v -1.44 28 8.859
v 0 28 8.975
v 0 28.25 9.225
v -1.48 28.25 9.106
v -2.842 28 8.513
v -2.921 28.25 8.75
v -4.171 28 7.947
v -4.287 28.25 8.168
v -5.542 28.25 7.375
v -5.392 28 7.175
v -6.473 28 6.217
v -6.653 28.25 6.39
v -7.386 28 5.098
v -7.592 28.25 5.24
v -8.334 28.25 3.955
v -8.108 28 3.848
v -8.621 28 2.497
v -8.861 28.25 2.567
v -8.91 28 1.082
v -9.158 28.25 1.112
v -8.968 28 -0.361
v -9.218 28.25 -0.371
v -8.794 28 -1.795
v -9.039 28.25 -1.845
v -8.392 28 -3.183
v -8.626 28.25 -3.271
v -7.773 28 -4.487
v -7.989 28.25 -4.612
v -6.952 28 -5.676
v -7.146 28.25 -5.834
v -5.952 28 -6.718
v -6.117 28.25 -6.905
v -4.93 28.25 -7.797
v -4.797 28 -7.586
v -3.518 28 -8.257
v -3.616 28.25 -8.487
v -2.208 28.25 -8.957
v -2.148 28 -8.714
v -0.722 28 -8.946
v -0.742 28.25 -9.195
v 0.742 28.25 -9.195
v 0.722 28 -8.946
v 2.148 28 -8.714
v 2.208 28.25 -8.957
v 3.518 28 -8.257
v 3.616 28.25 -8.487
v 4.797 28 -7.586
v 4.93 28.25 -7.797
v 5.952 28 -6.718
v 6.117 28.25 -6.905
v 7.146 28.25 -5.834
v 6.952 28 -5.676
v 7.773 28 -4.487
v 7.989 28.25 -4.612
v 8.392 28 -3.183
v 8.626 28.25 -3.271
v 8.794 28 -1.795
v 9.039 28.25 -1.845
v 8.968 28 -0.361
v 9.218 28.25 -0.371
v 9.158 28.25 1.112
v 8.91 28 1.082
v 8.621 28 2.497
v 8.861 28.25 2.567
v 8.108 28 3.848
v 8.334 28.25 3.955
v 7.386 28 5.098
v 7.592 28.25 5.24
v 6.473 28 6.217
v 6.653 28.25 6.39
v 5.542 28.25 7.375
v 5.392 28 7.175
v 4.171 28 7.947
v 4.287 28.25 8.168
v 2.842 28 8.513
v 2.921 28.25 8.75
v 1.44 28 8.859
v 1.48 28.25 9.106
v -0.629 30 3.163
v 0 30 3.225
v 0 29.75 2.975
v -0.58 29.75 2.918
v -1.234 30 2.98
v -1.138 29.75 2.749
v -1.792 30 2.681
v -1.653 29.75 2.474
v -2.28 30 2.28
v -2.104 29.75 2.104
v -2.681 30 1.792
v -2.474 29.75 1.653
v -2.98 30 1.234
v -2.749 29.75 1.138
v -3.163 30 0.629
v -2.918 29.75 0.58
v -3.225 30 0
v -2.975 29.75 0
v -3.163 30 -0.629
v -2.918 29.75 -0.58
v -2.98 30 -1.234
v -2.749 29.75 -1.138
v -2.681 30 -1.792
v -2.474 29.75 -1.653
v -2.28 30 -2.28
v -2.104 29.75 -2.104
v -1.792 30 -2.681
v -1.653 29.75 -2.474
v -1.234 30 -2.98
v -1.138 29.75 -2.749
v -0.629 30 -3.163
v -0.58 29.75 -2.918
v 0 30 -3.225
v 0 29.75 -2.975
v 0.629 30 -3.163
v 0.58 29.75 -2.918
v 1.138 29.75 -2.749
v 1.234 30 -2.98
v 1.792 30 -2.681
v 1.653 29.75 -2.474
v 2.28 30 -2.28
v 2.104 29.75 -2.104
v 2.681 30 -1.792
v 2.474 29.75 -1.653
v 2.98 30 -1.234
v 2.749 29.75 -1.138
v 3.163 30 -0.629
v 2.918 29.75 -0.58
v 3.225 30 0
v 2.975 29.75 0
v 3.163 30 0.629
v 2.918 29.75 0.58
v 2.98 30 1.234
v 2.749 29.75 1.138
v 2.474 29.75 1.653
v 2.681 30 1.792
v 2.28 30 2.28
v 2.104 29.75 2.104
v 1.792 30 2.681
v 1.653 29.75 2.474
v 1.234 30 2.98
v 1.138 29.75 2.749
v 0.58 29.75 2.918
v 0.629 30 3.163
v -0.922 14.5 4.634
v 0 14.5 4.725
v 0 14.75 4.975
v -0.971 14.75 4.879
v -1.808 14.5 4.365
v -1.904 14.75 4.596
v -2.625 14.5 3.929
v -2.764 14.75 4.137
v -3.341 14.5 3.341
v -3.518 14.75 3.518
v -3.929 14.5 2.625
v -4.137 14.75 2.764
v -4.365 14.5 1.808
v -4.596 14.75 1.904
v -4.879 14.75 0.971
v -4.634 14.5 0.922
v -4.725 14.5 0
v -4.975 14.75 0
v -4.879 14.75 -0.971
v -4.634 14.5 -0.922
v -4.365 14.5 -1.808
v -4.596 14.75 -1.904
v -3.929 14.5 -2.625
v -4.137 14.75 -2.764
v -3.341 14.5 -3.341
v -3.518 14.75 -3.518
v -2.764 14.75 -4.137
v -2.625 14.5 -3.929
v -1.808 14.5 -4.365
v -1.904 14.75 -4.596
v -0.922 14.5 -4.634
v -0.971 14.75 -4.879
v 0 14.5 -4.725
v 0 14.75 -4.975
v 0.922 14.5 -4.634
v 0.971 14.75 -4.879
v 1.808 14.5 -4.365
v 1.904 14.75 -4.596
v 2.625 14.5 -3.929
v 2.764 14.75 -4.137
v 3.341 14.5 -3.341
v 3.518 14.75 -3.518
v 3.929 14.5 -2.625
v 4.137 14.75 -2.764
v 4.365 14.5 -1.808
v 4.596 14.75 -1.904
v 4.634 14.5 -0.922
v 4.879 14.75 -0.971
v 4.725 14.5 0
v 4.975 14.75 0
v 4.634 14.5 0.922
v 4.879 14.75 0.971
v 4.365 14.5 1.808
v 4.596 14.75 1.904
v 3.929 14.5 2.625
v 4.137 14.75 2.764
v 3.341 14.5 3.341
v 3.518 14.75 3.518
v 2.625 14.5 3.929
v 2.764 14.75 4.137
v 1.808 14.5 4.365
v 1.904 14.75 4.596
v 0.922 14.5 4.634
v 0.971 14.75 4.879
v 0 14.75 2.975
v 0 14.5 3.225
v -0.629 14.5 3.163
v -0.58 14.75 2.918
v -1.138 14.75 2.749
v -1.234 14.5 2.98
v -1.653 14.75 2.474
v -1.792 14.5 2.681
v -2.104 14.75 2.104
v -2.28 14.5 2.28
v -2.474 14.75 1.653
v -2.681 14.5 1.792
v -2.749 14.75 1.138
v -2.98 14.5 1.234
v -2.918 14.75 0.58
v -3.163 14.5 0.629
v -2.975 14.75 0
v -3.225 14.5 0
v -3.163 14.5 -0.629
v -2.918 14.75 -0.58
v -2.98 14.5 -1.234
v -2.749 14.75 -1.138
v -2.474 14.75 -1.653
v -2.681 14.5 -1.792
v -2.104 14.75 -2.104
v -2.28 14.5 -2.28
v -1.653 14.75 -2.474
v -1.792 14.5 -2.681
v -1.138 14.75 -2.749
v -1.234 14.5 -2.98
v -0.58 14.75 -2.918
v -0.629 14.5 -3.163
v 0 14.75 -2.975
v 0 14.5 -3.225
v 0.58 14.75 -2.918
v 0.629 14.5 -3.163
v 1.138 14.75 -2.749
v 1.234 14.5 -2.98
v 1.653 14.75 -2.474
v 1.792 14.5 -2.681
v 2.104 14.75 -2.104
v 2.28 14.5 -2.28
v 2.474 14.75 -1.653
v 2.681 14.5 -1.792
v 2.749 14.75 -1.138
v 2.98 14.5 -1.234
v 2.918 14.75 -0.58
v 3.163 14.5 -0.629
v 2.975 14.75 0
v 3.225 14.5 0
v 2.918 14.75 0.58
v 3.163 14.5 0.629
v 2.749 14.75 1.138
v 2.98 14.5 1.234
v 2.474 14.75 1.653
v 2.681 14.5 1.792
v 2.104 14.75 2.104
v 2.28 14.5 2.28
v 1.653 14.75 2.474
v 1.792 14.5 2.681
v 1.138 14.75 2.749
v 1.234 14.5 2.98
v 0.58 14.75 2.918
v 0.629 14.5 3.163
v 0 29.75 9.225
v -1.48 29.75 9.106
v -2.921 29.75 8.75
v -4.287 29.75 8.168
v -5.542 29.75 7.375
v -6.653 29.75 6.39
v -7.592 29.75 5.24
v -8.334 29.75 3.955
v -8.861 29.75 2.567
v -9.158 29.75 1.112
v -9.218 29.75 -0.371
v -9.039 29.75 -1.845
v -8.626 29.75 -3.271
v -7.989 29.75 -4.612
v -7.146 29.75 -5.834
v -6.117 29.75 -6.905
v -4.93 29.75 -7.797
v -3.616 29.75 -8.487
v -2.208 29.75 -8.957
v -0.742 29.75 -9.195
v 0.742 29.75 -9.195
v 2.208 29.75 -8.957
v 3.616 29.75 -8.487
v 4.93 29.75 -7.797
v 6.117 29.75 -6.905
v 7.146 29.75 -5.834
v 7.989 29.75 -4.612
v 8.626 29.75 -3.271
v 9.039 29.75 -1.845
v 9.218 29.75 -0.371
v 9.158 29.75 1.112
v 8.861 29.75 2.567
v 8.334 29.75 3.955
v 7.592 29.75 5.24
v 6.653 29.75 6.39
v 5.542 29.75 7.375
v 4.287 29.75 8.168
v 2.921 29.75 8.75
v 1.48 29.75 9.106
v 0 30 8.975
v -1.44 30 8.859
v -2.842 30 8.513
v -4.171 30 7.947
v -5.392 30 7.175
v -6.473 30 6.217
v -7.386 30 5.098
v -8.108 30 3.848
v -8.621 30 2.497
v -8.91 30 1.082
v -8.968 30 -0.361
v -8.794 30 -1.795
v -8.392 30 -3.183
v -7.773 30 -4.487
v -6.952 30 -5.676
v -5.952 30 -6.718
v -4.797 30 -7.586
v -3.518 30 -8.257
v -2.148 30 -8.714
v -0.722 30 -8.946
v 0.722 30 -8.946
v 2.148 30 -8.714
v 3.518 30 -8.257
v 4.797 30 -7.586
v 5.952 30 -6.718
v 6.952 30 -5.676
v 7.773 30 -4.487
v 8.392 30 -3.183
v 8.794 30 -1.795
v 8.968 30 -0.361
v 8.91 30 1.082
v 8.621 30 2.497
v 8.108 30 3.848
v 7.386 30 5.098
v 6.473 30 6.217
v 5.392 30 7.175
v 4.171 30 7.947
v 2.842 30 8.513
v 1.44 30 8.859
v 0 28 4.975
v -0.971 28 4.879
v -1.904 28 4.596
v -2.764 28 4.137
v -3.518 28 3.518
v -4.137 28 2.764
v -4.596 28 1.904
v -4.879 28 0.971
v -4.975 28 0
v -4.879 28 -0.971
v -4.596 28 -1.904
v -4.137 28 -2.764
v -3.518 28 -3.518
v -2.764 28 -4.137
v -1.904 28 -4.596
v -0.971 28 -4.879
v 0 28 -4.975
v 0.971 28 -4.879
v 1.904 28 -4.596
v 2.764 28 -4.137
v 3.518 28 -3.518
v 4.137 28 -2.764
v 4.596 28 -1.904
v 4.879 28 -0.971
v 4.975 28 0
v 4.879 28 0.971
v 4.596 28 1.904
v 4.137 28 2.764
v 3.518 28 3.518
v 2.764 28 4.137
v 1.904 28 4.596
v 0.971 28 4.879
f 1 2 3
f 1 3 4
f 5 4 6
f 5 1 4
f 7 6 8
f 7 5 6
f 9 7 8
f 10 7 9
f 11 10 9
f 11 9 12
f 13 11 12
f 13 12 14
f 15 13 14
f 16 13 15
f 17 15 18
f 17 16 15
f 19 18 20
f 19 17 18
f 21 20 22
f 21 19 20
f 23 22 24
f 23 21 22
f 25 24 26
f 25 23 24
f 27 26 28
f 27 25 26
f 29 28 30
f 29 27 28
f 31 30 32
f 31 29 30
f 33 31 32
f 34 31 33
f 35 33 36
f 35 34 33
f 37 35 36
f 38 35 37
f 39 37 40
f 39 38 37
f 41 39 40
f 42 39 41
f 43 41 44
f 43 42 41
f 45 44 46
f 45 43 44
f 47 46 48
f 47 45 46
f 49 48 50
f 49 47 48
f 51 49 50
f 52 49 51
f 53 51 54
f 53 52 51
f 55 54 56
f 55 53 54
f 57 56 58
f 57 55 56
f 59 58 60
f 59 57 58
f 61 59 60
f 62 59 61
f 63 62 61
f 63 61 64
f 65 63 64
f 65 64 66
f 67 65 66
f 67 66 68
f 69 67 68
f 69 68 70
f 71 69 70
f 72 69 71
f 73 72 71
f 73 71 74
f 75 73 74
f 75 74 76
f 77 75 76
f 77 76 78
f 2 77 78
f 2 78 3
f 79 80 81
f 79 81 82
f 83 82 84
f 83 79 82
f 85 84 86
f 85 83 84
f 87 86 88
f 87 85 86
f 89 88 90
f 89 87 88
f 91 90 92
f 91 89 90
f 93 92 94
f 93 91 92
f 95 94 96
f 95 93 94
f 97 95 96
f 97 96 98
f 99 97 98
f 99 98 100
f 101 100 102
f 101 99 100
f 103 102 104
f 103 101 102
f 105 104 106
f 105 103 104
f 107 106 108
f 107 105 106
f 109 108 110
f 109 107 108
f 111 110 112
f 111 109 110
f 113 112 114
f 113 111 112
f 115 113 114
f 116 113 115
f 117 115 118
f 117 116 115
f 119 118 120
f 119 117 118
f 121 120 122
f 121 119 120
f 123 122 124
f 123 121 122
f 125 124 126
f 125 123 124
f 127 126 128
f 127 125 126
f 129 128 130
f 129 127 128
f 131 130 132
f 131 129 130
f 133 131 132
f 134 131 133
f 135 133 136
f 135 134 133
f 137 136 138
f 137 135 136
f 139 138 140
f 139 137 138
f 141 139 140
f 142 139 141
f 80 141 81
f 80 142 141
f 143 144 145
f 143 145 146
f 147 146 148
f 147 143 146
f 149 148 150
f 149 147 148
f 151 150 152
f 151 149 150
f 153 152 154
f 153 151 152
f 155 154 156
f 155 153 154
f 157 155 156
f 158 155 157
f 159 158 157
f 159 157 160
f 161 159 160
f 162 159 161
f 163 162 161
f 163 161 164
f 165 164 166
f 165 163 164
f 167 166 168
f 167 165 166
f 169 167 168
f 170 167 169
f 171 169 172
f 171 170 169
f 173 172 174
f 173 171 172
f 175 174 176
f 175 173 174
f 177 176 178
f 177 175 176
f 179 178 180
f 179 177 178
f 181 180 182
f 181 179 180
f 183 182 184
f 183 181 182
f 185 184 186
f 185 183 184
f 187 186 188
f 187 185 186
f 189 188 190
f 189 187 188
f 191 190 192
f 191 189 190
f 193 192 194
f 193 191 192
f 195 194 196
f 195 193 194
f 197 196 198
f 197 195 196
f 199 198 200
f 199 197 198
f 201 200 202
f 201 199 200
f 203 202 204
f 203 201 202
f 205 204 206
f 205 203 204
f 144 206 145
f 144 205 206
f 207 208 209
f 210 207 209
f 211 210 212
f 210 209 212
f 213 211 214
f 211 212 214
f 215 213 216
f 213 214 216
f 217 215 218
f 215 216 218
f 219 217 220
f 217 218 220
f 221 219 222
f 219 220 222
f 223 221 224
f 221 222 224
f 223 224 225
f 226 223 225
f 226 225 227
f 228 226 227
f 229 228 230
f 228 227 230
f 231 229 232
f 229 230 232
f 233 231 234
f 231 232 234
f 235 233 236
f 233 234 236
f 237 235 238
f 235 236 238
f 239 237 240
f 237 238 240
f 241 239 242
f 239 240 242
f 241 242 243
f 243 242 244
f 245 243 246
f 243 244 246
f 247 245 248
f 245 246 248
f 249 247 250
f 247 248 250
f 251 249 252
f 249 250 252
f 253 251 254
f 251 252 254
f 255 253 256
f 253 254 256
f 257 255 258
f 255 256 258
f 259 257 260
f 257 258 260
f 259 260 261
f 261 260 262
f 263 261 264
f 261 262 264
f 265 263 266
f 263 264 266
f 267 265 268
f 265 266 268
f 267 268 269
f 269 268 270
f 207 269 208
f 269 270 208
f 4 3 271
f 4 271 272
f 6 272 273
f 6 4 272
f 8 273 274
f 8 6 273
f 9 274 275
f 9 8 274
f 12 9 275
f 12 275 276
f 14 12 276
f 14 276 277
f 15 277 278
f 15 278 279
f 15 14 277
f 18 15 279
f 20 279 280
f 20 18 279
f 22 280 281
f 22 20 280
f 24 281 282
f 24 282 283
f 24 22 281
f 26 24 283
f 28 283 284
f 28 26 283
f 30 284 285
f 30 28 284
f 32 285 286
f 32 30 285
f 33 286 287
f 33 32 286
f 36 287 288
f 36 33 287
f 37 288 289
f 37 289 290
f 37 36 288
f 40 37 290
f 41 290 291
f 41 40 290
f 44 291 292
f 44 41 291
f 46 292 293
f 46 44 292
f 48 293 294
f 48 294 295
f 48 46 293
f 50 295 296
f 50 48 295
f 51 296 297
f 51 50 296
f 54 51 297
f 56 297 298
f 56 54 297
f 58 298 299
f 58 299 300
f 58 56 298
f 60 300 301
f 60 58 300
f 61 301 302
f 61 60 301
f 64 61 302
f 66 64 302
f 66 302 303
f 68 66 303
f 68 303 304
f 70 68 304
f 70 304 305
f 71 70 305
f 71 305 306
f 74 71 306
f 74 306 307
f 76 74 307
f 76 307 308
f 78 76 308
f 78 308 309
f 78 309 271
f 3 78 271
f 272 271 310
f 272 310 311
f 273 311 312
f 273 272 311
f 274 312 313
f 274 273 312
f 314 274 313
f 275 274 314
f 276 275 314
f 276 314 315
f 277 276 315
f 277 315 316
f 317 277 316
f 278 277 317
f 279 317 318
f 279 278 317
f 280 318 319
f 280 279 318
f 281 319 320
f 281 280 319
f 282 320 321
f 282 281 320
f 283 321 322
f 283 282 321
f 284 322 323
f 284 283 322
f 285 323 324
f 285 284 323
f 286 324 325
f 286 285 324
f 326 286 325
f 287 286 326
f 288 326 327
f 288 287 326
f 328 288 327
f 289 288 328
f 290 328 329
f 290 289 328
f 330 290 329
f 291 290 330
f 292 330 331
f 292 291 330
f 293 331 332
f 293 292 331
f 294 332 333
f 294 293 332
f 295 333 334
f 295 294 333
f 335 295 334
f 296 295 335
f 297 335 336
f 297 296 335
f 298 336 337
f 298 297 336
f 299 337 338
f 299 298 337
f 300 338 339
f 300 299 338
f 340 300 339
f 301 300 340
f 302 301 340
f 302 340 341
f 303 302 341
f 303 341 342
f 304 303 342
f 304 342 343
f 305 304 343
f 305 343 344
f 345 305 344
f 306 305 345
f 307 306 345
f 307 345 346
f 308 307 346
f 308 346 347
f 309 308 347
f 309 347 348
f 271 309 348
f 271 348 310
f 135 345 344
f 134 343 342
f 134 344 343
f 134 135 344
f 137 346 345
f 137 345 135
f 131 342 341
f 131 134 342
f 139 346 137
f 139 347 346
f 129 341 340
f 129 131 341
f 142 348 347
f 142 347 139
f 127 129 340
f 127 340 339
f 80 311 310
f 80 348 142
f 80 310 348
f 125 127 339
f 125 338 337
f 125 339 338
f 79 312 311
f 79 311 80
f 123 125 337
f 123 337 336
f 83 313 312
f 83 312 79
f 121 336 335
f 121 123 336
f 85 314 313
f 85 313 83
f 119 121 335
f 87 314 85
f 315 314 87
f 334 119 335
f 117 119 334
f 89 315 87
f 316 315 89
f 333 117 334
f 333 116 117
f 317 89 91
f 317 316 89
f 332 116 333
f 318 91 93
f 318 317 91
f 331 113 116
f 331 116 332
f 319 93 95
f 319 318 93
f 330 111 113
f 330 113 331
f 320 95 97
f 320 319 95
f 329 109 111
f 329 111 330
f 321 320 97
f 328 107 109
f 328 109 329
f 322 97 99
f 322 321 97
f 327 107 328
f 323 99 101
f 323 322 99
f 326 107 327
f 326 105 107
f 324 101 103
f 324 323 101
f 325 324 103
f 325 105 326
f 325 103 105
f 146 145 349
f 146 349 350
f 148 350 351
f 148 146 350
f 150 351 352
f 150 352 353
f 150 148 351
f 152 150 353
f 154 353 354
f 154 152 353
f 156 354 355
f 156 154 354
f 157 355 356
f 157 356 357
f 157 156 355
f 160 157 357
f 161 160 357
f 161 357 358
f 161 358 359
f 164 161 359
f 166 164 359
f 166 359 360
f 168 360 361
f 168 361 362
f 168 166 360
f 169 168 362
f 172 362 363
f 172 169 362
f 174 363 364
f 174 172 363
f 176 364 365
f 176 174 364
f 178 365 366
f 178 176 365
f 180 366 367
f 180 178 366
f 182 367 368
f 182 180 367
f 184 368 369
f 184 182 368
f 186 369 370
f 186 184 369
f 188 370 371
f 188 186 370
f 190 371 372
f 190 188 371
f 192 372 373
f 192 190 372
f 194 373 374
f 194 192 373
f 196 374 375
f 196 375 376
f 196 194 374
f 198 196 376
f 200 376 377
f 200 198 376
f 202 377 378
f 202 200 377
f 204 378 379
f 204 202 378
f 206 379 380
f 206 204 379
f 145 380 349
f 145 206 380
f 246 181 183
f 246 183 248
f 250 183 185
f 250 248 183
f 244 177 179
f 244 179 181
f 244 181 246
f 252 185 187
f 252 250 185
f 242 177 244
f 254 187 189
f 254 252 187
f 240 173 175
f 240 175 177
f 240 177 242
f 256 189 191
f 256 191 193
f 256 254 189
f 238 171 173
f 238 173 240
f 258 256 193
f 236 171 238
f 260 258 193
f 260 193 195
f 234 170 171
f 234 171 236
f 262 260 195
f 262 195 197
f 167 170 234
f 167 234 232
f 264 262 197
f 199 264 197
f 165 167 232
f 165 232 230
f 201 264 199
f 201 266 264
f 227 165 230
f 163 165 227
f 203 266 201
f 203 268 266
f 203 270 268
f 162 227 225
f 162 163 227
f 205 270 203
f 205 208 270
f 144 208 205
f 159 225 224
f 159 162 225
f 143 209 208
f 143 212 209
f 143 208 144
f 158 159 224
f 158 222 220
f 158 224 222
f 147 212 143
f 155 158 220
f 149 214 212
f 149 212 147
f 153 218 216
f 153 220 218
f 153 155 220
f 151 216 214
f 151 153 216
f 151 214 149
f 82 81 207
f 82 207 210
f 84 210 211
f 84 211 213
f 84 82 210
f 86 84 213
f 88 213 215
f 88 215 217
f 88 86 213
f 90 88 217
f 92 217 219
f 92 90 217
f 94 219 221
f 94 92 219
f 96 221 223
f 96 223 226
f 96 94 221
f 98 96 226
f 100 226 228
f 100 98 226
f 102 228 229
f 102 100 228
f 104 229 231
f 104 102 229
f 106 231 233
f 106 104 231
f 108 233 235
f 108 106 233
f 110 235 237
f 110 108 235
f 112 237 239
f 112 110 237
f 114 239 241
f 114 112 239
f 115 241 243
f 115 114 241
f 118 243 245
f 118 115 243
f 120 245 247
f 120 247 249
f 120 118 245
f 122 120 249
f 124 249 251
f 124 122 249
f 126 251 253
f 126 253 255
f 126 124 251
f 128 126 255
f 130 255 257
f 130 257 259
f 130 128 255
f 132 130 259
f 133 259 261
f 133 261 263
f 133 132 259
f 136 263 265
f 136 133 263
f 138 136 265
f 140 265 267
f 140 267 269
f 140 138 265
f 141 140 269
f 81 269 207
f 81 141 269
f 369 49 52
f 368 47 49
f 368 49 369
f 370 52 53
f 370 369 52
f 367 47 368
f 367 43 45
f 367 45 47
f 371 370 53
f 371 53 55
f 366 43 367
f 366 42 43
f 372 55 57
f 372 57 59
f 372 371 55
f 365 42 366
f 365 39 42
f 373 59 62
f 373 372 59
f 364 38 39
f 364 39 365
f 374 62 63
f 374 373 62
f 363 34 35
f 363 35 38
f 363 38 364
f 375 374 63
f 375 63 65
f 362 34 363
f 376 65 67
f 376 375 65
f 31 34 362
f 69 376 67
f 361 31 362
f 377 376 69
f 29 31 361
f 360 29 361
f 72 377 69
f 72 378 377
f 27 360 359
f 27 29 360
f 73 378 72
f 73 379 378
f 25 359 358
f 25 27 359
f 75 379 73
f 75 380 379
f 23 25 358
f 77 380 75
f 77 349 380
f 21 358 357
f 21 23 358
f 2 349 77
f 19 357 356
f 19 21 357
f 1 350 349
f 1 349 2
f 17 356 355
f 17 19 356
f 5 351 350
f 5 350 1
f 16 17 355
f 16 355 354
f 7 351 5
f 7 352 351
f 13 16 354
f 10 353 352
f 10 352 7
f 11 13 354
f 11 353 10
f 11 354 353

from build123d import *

# Parameters (mm, degrees)
CHANFREIN1_SIZE = 0.25


with BuildPart() as part:
    # Esquisse1 → Base-Révolution (revolve)
    with BuildSketch(Plane.XY, mode=Mode.PRIVATE) as base_r_volution_sk:
        Polygon((2.975, 14.5), (2.975, 30), (9.225, 30), (9.225, 28), (4.975, 28), (4.975, 14.5), align=None)
    revolve(base_r_volution_sk.sketch.rotate(Axis((0, 30, 0), (0, -1, 0)), 90), axis=Axis((0, 30, 0), (0, -1, 0)))

    # Chanfrein1
    chanfrein1_edges = [part.edges().sort_by_distance(p)[0] for p in [
        (0, 14.5, -2.975),
        (0, 30, -2.975),
        (0, 30, -9.225),
        (0, 28, -9.225),
        (0, 14.5, -4.975),
    ]]
    chamfer(chanfrein1_edges, length=CHANFREIN1_SIZE)


solid = part.part
